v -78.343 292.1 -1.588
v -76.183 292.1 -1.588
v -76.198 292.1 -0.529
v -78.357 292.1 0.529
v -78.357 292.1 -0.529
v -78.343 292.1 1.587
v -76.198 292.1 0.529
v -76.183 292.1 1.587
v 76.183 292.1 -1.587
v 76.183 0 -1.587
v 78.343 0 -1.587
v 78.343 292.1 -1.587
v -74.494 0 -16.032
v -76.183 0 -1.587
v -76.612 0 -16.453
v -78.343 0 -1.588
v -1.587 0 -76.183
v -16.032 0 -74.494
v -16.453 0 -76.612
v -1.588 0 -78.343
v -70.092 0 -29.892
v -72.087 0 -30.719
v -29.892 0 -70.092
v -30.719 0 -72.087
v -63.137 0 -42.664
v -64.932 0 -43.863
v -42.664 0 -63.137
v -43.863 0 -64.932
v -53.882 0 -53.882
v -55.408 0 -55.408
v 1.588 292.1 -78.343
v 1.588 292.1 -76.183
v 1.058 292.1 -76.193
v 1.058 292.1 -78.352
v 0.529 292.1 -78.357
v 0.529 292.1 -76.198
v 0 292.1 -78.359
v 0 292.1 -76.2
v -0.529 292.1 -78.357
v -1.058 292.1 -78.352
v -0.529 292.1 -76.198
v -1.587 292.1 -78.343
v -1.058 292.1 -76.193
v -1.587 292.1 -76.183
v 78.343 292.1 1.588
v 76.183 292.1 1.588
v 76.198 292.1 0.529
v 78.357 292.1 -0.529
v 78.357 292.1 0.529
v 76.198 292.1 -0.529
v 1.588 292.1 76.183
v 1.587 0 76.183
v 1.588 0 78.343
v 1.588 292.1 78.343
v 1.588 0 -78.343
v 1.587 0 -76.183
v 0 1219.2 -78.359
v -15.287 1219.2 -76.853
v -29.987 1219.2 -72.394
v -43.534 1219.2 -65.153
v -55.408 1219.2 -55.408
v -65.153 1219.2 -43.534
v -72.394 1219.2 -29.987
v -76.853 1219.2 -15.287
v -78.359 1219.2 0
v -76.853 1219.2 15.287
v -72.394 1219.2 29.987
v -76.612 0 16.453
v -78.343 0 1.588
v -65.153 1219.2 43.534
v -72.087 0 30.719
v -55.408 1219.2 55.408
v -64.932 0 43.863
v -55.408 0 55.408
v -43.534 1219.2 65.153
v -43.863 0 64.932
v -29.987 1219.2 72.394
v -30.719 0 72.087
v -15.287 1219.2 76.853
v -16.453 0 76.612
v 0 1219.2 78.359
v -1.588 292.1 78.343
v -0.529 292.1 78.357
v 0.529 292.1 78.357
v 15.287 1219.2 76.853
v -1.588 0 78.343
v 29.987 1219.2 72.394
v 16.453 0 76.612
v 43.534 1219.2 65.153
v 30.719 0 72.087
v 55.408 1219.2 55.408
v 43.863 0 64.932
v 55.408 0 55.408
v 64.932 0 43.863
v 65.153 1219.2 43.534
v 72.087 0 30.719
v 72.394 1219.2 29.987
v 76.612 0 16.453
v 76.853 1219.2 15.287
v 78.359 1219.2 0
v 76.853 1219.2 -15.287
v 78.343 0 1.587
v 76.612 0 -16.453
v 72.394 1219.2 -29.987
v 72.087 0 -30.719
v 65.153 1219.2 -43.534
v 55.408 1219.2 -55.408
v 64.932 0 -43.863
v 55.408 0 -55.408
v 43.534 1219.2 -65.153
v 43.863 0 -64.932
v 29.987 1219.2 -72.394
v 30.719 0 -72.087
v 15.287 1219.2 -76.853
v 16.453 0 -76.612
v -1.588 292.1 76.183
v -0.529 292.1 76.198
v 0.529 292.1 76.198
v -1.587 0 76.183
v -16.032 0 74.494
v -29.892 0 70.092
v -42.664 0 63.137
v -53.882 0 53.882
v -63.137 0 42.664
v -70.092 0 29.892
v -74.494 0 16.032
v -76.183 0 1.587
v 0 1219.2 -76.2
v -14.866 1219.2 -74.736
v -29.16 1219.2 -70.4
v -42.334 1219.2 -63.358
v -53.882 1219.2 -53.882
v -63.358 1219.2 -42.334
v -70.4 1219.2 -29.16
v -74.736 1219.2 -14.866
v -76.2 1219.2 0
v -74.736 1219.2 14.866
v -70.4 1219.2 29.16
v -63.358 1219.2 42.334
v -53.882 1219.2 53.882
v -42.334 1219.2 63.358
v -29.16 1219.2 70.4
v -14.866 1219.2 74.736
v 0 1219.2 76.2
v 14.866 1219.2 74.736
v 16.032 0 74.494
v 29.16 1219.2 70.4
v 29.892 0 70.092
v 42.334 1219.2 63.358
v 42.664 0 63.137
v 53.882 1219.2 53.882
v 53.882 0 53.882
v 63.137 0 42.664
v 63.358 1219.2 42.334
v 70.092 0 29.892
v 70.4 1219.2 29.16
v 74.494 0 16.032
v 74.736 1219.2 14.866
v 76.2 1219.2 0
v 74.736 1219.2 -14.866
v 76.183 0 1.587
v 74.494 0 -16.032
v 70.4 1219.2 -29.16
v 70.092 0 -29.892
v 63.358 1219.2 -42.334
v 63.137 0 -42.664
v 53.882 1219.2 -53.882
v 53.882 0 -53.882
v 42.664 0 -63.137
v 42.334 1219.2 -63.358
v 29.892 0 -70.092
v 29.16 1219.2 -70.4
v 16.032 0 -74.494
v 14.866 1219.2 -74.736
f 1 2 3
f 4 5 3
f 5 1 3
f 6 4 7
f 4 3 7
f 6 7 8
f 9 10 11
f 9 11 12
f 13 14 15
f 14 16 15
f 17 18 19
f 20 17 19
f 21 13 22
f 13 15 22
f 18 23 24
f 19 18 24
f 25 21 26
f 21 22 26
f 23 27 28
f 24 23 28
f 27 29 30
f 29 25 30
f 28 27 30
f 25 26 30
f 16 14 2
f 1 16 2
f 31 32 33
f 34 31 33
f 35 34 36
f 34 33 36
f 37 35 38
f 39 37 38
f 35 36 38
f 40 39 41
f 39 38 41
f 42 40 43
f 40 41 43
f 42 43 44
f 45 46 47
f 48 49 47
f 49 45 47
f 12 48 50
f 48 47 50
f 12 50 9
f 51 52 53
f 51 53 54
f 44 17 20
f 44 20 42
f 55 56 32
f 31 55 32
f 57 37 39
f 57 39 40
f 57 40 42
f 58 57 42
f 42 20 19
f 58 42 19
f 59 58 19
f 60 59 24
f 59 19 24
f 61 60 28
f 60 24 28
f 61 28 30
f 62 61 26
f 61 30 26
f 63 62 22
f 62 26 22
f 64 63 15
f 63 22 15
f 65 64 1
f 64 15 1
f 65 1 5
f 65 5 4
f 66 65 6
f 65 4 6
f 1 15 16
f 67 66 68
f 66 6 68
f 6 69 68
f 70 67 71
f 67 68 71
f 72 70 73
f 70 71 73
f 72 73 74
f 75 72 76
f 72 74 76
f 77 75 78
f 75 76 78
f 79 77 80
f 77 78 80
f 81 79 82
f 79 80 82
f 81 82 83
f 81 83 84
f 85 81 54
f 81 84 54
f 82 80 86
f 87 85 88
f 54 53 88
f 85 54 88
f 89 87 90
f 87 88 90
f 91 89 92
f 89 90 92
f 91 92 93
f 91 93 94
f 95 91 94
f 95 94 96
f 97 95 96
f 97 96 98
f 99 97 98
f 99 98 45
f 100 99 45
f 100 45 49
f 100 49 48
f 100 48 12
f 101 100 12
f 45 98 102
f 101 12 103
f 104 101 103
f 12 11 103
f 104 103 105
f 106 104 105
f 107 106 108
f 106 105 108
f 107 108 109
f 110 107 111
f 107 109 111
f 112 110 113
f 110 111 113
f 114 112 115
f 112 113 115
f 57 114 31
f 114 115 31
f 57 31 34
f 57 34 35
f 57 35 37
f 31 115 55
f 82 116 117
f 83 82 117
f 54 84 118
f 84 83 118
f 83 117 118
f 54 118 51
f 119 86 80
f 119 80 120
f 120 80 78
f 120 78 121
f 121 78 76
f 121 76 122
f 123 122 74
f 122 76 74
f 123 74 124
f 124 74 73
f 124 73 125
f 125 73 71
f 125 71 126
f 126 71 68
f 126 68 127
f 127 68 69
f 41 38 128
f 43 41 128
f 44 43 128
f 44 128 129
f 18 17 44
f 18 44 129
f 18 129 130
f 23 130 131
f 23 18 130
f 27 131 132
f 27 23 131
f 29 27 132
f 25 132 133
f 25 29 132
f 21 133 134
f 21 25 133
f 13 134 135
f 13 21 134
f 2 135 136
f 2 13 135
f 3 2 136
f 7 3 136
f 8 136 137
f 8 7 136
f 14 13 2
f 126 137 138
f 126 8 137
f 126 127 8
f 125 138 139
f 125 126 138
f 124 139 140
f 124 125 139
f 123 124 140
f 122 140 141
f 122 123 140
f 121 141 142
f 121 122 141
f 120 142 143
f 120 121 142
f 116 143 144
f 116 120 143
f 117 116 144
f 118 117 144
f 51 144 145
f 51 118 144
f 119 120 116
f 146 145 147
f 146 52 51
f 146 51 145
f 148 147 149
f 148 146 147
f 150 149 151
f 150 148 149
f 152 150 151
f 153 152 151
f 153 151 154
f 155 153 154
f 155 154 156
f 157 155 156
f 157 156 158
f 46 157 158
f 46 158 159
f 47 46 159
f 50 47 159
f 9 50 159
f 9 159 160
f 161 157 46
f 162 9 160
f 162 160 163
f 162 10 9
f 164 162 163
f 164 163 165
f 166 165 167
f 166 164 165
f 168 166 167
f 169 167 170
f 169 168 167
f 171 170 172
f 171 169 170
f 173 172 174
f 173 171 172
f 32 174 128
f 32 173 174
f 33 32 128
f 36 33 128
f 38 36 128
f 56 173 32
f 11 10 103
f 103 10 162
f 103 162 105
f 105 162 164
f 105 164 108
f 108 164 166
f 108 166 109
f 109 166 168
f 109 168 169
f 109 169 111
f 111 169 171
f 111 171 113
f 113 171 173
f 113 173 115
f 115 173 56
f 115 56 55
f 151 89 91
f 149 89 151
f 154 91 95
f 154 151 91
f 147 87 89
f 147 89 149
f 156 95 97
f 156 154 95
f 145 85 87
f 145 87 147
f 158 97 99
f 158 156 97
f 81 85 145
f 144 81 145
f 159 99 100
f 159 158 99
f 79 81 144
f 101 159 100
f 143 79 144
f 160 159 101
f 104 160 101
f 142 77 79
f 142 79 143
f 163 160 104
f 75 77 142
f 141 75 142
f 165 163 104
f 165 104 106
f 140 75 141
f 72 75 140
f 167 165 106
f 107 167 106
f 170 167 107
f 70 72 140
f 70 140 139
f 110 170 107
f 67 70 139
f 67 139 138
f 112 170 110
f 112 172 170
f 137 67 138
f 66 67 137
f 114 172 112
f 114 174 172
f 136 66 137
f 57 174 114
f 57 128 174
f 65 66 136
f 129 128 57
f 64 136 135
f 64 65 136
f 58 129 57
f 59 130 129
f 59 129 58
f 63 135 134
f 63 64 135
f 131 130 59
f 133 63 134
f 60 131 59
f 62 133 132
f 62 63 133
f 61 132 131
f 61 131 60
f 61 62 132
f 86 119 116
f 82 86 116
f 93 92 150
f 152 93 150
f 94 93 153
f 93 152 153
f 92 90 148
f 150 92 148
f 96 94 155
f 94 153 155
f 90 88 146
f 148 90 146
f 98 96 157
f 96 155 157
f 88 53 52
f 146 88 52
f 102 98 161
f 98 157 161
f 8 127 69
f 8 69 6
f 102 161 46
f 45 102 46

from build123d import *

# Parameters (mm, degrees)
SKETCH1_R           = 78.359
SKETCH1_R_2         = 76.2
BOSS_EXTRUDE1_DEPTH = 1219.2
SKETCH2_W           = 3.175
SKETCH2_H           = 292.1
CUT_EXTRUDE2_DEPTH  = 1225.225839362
CIRPATTERN1_COUNT   = 4


with BuildPart() as part:
    # Sketch1 → Boss-Extrude1 (new body)
    with BuildSketch(Plane(origin=(0, 0, 0), x_dir=(1, 0, 0), z_dir=(0, 1, 0))):
        with Locations(Location((0, 0, 0), (0, 0, 90))):
            Circle(SKETCH1_R)
        with Locations(Location((0, 0, 0), (0, 0, 90))):
            Circle(SKETCH1_R_2, mode=Mode.SUBTRACT)
    extrude(amount=BOSS_EXTRUDE1_DEPTH)

    # Sketch2 → Cut-Extrude2 (cut, through all)
    with BuildSketch(Plane.XY):
        with Locations((0, 146.05)):
            Rectangle(SKETCH2_W, SKETCH2_H)
    cut_extrude2 = extrude(amount=CUT_EXTRUDE2_DEPTH, mode=Mode.SUBTRACT)

    # CirPattern1: Cut-Extrude2 ×4 about axis
    cirpattern1_axis = Axis((0, 0, 0), (0, 1, 0))
    for i in range(1, CIRPATTERN1_COUNT):
        add(cut_extrude2.rotate(cirpattern1_axis, i * 360 / CIRPATTERN1_COUNT), mode=Mode.SUBTRACT)


solid = part.part
